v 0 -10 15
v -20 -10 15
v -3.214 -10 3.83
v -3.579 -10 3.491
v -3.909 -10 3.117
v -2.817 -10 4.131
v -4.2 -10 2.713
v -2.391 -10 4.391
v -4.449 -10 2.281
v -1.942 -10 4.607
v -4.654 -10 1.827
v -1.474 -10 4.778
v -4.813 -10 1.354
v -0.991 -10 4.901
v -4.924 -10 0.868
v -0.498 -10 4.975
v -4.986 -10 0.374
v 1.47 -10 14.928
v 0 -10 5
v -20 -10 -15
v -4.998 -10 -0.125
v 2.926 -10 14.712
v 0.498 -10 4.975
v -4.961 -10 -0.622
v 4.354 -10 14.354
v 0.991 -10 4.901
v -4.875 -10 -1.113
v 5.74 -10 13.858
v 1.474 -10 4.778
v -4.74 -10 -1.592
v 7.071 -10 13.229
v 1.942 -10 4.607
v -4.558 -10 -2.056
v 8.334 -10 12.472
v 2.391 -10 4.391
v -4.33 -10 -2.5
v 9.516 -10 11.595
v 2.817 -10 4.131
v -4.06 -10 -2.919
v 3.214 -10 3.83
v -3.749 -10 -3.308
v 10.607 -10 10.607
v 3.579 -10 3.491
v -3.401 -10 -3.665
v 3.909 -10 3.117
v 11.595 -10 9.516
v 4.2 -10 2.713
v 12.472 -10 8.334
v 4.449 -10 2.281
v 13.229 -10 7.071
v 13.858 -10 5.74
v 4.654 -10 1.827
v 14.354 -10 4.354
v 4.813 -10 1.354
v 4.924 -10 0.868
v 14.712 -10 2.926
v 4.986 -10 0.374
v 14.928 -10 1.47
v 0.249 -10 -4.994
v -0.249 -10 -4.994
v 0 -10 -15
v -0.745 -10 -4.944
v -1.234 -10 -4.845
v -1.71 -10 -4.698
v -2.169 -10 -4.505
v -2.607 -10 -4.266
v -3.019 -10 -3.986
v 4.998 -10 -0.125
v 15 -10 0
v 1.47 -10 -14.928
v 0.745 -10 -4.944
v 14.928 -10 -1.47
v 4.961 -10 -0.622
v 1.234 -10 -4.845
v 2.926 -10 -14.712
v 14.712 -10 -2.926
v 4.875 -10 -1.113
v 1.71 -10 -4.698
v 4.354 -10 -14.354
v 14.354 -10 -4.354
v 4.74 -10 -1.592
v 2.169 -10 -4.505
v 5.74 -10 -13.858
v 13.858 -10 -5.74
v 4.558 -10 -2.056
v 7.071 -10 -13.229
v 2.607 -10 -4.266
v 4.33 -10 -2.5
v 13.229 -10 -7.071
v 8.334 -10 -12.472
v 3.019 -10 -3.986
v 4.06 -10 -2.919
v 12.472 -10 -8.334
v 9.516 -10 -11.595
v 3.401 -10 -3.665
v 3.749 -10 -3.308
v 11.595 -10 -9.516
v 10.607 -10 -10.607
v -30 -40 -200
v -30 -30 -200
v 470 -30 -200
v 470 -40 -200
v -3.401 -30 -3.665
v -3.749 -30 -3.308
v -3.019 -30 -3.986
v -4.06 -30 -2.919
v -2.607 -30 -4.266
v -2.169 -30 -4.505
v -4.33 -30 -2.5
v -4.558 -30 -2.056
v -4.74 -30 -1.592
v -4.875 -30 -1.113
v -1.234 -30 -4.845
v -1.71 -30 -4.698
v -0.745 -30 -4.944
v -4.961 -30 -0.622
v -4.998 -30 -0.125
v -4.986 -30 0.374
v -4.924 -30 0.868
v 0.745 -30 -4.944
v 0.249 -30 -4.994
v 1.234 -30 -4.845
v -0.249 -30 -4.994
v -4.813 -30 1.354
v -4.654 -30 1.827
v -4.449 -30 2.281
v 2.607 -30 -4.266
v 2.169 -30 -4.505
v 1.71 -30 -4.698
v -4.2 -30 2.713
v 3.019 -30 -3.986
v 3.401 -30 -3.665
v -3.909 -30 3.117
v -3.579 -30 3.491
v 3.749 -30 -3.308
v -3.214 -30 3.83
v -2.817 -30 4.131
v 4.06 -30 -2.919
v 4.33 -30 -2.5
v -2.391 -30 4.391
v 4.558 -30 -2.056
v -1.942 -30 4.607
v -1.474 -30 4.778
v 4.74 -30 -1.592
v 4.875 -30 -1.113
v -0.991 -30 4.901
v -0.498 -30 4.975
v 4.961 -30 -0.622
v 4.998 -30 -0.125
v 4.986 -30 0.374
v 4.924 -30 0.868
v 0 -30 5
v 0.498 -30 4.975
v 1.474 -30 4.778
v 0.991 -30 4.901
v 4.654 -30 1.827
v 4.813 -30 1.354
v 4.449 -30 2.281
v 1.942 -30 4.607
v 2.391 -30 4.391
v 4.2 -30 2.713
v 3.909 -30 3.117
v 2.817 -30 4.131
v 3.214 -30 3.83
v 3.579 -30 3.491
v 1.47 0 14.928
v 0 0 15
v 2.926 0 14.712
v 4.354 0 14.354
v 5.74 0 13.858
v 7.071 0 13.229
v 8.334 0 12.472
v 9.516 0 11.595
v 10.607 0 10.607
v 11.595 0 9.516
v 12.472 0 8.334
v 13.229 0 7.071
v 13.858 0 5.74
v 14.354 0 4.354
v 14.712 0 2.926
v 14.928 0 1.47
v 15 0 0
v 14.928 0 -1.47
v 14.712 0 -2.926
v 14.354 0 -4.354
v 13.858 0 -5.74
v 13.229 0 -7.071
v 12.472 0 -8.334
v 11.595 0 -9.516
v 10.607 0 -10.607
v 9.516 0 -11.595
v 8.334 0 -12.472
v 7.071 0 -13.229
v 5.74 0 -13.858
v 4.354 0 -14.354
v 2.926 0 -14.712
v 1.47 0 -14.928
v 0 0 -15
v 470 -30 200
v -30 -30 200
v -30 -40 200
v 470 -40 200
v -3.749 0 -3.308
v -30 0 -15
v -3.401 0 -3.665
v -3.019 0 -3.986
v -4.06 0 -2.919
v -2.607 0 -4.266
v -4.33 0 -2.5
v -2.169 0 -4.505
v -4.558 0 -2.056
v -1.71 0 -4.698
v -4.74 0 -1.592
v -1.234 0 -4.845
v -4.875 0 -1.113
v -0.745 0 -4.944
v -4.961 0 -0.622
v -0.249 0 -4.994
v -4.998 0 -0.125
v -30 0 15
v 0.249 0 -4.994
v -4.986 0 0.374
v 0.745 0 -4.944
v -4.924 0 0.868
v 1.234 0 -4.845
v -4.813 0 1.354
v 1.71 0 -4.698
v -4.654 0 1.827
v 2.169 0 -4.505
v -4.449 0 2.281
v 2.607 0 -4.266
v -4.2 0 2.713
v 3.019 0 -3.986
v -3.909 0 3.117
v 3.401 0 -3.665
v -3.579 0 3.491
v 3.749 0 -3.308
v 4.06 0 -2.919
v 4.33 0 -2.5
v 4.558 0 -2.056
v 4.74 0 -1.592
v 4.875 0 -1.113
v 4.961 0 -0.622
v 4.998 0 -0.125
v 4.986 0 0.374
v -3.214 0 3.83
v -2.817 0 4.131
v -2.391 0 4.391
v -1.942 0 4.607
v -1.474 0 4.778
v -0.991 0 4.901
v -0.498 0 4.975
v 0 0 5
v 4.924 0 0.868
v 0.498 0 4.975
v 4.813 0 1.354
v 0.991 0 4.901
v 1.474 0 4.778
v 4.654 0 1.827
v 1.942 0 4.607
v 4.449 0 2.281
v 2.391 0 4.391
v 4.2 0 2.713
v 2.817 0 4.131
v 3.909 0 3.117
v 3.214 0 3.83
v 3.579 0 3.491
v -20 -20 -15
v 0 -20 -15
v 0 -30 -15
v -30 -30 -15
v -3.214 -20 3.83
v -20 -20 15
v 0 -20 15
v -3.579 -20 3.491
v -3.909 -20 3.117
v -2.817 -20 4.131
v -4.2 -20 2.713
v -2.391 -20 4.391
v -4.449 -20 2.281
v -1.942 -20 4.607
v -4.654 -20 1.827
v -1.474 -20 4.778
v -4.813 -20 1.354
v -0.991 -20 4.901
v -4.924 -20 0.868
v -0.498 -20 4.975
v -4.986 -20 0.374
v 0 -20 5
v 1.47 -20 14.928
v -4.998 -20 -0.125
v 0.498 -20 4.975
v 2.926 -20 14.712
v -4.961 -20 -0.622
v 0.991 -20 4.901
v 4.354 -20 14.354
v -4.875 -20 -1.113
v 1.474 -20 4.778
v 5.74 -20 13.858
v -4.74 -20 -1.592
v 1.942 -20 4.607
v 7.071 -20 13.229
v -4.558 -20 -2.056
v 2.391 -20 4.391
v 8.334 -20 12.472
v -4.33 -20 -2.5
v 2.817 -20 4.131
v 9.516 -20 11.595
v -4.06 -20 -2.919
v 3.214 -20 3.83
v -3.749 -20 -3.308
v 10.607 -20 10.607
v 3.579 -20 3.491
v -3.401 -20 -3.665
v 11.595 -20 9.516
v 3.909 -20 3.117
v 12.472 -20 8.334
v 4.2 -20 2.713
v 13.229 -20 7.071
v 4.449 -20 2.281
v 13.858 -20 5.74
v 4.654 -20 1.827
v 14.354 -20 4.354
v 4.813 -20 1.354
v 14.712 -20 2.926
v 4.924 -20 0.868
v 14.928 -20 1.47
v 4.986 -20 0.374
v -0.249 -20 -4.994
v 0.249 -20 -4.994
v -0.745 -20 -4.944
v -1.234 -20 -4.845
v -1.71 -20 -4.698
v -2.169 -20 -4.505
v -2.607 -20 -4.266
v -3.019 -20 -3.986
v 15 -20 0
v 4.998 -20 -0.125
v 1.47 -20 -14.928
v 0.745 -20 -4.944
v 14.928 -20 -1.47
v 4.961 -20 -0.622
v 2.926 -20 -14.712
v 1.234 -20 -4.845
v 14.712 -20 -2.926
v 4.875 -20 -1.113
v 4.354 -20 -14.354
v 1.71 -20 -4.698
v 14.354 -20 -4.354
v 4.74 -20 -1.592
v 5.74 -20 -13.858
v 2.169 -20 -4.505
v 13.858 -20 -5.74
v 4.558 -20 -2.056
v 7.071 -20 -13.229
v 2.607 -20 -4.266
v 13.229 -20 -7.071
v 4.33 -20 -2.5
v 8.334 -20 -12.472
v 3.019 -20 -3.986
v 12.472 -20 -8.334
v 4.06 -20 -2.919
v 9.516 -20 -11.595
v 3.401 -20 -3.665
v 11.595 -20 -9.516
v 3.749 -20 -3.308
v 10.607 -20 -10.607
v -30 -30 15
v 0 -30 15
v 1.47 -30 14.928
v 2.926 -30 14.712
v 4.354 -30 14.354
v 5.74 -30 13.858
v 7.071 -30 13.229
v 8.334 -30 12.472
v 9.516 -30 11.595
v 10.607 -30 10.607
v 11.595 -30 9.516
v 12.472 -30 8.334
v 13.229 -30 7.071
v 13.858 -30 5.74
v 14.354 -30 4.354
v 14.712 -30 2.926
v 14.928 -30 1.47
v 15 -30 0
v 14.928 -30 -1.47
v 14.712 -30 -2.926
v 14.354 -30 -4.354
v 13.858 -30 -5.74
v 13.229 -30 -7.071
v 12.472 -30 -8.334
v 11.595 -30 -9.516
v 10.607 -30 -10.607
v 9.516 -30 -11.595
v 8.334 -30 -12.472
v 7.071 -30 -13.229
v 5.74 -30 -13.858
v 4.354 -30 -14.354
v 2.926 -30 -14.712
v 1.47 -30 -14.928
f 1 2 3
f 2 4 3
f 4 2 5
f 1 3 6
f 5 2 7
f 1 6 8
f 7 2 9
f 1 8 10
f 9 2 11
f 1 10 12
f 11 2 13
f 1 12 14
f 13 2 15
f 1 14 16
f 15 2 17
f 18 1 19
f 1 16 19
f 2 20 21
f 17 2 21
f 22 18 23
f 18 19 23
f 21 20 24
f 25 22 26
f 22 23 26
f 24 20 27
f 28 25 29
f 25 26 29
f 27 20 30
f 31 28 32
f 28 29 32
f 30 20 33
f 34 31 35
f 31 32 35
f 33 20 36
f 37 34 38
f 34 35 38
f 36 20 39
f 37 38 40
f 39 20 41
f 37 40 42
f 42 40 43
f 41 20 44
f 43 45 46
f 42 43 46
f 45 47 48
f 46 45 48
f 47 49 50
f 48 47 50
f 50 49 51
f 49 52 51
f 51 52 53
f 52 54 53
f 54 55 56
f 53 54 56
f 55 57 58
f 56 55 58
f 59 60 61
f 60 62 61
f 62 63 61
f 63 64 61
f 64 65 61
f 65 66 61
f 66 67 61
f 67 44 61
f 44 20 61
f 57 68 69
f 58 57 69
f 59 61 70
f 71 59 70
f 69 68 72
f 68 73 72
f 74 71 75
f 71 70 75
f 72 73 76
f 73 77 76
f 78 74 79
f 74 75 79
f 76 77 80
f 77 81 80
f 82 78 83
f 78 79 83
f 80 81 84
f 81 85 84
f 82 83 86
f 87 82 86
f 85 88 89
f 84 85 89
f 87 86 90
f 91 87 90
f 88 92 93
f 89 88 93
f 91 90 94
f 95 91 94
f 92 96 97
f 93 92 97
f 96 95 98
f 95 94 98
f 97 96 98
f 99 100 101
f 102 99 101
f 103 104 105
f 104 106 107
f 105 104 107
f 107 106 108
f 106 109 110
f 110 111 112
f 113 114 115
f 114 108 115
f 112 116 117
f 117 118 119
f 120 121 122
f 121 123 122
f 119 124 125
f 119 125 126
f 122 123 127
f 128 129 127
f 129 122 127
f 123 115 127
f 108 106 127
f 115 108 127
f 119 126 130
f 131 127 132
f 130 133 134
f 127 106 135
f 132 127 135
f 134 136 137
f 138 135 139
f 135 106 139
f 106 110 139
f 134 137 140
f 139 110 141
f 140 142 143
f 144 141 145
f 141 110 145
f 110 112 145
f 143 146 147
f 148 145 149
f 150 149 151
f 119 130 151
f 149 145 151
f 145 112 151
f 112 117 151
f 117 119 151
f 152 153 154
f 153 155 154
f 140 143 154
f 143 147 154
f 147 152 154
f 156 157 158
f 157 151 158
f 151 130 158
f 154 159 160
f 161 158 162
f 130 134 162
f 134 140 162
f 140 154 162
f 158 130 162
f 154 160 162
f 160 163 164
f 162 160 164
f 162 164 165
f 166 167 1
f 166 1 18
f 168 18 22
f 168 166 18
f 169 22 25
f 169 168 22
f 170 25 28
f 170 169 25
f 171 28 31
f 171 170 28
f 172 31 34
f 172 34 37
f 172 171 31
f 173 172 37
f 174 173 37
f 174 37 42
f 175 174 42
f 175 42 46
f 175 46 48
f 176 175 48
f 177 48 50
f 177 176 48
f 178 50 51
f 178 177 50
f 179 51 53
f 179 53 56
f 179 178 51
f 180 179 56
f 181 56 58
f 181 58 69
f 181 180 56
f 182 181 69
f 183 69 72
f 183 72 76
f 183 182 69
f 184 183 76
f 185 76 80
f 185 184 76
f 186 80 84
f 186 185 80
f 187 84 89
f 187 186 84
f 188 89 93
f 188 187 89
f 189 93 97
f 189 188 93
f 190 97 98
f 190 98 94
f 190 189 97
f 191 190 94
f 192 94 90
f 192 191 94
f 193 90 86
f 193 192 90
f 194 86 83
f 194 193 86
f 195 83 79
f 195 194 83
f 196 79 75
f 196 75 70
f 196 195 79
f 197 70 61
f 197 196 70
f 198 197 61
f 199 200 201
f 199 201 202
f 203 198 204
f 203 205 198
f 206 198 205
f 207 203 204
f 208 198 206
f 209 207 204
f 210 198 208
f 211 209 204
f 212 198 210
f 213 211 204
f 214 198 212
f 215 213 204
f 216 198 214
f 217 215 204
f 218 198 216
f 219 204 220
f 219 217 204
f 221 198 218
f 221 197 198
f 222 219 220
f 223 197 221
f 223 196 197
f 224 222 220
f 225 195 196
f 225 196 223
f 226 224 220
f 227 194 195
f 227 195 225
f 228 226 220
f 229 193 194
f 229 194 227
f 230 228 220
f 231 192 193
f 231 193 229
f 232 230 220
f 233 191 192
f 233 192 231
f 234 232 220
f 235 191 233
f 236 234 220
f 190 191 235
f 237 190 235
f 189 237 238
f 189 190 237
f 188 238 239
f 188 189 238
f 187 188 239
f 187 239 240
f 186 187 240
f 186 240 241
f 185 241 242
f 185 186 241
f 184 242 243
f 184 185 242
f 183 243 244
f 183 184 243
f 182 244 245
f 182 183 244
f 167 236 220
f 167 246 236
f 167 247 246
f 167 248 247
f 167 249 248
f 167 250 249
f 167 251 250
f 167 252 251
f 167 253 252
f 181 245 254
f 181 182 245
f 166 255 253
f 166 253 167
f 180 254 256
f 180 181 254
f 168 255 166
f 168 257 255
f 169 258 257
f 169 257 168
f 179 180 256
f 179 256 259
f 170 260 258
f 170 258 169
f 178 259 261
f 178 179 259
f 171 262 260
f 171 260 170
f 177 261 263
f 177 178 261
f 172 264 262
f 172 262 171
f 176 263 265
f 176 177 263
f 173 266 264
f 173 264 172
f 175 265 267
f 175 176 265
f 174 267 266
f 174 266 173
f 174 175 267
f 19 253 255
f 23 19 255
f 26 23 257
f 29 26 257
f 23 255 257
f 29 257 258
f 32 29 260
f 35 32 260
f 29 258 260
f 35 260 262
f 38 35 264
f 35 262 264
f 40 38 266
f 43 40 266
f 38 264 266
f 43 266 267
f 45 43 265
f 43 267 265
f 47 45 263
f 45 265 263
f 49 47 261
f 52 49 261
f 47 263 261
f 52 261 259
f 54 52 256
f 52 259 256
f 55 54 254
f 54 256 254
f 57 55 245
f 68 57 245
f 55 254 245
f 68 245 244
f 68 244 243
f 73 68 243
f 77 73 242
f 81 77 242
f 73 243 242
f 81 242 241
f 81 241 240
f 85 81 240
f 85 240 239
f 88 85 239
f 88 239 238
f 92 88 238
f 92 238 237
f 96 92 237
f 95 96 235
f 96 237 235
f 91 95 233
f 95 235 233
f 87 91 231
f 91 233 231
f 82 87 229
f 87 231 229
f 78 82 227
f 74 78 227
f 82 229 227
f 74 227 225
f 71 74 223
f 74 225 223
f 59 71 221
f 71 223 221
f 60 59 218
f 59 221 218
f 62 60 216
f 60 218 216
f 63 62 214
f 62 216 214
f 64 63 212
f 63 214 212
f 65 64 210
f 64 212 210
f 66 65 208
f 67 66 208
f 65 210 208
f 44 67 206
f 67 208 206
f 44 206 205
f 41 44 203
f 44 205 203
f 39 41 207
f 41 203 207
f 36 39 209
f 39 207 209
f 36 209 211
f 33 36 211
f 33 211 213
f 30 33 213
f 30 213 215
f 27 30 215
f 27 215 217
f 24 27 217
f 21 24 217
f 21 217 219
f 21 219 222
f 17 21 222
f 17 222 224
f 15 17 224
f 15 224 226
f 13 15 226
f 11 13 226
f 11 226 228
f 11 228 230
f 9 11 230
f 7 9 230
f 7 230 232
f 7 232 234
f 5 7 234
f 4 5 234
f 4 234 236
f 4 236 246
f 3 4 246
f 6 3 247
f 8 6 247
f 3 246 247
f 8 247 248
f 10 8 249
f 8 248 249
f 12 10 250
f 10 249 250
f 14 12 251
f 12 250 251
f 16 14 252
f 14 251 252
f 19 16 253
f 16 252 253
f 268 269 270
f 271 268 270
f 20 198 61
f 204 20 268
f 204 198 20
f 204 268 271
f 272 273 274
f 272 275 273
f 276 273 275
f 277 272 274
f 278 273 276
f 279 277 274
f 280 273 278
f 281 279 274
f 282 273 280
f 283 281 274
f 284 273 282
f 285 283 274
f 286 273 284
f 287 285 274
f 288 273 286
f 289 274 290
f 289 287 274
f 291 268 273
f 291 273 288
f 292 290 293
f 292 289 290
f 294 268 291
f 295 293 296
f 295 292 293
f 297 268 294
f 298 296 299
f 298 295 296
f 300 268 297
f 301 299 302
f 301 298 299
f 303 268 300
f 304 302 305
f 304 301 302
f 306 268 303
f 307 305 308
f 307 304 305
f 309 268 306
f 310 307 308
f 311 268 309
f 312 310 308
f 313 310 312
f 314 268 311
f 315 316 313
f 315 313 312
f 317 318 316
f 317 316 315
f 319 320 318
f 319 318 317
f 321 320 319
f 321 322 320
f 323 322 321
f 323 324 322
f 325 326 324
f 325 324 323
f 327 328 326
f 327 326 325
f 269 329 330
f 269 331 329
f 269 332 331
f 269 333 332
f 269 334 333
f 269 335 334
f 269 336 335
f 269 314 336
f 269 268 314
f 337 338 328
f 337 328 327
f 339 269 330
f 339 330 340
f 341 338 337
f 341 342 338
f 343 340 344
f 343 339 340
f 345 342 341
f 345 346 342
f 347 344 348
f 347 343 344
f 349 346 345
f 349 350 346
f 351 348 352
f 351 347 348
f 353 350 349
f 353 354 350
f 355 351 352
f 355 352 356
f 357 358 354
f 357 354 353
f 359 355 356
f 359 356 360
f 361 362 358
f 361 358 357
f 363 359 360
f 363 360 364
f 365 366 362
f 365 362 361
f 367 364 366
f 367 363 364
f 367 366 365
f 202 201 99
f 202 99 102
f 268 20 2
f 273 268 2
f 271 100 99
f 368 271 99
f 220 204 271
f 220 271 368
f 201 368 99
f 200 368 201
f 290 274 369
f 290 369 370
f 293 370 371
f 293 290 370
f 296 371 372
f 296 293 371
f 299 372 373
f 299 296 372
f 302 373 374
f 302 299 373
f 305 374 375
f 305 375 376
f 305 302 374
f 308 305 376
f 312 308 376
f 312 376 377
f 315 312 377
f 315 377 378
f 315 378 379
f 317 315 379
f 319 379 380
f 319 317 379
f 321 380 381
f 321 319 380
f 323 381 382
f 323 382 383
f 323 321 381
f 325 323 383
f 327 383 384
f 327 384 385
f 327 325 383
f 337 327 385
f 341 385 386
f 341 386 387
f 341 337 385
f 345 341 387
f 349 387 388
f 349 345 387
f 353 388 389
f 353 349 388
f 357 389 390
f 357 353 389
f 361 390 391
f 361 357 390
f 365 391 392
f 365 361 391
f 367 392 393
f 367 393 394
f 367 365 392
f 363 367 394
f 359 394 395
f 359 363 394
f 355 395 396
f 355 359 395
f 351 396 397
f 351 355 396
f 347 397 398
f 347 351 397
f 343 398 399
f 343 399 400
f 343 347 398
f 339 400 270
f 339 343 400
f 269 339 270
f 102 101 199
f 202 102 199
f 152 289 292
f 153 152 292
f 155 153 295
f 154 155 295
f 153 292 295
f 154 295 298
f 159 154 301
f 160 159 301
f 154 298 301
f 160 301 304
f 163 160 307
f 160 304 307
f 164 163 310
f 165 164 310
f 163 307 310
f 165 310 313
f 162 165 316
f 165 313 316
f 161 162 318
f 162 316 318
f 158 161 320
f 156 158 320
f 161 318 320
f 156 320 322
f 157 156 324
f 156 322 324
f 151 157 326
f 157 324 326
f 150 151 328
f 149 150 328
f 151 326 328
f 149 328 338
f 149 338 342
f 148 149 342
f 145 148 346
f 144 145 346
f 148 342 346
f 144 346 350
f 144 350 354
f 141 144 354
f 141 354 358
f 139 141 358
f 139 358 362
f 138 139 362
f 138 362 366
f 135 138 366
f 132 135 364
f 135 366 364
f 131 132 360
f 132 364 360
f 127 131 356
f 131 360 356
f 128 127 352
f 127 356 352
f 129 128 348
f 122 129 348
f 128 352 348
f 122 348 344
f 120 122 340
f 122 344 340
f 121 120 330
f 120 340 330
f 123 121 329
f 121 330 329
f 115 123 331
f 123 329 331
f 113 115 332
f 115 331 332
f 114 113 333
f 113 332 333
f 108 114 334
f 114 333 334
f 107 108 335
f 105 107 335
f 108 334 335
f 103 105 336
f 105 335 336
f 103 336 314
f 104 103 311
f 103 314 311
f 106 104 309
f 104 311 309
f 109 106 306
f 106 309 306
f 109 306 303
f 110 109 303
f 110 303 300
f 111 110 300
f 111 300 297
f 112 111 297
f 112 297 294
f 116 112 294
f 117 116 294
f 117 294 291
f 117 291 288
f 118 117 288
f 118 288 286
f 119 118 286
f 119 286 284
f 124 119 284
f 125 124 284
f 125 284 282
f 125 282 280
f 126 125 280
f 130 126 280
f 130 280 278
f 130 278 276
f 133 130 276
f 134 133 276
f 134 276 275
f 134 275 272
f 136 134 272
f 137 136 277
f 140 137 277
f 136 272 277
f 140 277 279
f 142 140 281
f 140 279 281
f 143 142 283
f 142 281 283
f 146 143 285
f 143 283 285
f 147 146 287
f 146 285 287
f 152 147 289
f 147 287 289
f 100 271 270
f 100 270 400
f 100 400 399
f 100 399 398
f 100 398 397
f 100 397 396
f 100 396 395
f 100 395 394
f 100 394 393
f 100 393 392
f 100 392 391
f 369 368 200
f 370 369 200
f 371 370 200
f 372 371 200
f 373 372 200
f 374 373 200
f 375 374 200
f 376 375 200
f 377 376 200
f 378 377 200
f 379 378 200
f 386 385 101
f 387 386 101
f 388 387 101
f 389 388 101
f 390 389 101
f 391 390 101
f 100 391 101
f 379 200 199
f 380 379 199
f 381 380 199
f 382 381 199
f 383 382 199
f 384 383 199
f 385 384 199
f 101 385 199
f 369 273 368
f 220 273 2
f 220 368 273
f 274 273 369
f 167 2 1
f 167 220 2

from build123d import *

# Parameters (mm, degrees)
SKETCH1_R           = 5
BOSS_EXTRUDE1_DEPTH = 10
SKETCH2_W           = 30
SKETCH2_H           = 30
BOSS_EXTRUDE2_DEPTH = 10
BOSS_EXTRUDE3_START = -20
SKETCH1_2_R         = 5
BOSS_EXTRUDE3_DEPTH = 10
SKETCH3_W           = 500
SKETCH3_H           = 400
BOSS_EXTRUDE4_DEPTH = 10


with BuildPart() as part:
    # Sketch1 → Boss-Extrude1 (new body)
    with BuildSketch(Plane(origin=(0, 0, 0), x_dir=(1, 0, 0), z_dir=(0, 1, 0))):
        with BuildLine():
            Line((0, 15), (-20, 15))
            Line((-20, 15), (-20, -15))
            Line((-20, -15), (0, -15))
            ThreePointArc((0, -15), (15, 0), (0, 15))
        make_face()
        Circle(SKETCH1_R, mode=Mode.SUBTRACT)
    extrude(amount=-BOSS_EXTRUDE1_DEPTH)

    # Sketch2 → Boss-Extrude2 (add)
    with BuildSketch(Plane.ZY.offset(20)):
        with Locations((0, -15)):
            Rectangle(SKETCH2_W, SKETCH2_H)
    extrude(amount=BOSS_EXTRUDE2_DEPTH)

    # Sketch1<2> → Boss-Extrude3 (add)
    with BuildSketch(Plane(origin=(0, 0, 0), x_dir=(1, 0, 0), z_dir=(0, 1, 0)).offset(BOSS_EXTRUDE3_START)):
        with BuildLine():
            Line((0, 15), (-20, 15))
            Line((-20, 15), (-20, -15))
            Line((-20, -15), (0, -15))
            ThreePointArc((0, -15), (15, 0), (0, 15))
        make_face()
        Circle(SKETCH1_2_R, mode=Mode.SUBTRACT)
    extrude(amount=-BOSS_EXTRUDE3_DEPTH)

    # Sketch3 → Boss-Extrude4 (add)
    with BuildSketch(Plane.XZ.offset(30)):
        with Locations((220, 0)):
            Rectangle(SKETCH3_W, SKETCH3_H)
    extrude(amount=BOSS_EXTRUDE4_DEPTH)


solid = part.part
